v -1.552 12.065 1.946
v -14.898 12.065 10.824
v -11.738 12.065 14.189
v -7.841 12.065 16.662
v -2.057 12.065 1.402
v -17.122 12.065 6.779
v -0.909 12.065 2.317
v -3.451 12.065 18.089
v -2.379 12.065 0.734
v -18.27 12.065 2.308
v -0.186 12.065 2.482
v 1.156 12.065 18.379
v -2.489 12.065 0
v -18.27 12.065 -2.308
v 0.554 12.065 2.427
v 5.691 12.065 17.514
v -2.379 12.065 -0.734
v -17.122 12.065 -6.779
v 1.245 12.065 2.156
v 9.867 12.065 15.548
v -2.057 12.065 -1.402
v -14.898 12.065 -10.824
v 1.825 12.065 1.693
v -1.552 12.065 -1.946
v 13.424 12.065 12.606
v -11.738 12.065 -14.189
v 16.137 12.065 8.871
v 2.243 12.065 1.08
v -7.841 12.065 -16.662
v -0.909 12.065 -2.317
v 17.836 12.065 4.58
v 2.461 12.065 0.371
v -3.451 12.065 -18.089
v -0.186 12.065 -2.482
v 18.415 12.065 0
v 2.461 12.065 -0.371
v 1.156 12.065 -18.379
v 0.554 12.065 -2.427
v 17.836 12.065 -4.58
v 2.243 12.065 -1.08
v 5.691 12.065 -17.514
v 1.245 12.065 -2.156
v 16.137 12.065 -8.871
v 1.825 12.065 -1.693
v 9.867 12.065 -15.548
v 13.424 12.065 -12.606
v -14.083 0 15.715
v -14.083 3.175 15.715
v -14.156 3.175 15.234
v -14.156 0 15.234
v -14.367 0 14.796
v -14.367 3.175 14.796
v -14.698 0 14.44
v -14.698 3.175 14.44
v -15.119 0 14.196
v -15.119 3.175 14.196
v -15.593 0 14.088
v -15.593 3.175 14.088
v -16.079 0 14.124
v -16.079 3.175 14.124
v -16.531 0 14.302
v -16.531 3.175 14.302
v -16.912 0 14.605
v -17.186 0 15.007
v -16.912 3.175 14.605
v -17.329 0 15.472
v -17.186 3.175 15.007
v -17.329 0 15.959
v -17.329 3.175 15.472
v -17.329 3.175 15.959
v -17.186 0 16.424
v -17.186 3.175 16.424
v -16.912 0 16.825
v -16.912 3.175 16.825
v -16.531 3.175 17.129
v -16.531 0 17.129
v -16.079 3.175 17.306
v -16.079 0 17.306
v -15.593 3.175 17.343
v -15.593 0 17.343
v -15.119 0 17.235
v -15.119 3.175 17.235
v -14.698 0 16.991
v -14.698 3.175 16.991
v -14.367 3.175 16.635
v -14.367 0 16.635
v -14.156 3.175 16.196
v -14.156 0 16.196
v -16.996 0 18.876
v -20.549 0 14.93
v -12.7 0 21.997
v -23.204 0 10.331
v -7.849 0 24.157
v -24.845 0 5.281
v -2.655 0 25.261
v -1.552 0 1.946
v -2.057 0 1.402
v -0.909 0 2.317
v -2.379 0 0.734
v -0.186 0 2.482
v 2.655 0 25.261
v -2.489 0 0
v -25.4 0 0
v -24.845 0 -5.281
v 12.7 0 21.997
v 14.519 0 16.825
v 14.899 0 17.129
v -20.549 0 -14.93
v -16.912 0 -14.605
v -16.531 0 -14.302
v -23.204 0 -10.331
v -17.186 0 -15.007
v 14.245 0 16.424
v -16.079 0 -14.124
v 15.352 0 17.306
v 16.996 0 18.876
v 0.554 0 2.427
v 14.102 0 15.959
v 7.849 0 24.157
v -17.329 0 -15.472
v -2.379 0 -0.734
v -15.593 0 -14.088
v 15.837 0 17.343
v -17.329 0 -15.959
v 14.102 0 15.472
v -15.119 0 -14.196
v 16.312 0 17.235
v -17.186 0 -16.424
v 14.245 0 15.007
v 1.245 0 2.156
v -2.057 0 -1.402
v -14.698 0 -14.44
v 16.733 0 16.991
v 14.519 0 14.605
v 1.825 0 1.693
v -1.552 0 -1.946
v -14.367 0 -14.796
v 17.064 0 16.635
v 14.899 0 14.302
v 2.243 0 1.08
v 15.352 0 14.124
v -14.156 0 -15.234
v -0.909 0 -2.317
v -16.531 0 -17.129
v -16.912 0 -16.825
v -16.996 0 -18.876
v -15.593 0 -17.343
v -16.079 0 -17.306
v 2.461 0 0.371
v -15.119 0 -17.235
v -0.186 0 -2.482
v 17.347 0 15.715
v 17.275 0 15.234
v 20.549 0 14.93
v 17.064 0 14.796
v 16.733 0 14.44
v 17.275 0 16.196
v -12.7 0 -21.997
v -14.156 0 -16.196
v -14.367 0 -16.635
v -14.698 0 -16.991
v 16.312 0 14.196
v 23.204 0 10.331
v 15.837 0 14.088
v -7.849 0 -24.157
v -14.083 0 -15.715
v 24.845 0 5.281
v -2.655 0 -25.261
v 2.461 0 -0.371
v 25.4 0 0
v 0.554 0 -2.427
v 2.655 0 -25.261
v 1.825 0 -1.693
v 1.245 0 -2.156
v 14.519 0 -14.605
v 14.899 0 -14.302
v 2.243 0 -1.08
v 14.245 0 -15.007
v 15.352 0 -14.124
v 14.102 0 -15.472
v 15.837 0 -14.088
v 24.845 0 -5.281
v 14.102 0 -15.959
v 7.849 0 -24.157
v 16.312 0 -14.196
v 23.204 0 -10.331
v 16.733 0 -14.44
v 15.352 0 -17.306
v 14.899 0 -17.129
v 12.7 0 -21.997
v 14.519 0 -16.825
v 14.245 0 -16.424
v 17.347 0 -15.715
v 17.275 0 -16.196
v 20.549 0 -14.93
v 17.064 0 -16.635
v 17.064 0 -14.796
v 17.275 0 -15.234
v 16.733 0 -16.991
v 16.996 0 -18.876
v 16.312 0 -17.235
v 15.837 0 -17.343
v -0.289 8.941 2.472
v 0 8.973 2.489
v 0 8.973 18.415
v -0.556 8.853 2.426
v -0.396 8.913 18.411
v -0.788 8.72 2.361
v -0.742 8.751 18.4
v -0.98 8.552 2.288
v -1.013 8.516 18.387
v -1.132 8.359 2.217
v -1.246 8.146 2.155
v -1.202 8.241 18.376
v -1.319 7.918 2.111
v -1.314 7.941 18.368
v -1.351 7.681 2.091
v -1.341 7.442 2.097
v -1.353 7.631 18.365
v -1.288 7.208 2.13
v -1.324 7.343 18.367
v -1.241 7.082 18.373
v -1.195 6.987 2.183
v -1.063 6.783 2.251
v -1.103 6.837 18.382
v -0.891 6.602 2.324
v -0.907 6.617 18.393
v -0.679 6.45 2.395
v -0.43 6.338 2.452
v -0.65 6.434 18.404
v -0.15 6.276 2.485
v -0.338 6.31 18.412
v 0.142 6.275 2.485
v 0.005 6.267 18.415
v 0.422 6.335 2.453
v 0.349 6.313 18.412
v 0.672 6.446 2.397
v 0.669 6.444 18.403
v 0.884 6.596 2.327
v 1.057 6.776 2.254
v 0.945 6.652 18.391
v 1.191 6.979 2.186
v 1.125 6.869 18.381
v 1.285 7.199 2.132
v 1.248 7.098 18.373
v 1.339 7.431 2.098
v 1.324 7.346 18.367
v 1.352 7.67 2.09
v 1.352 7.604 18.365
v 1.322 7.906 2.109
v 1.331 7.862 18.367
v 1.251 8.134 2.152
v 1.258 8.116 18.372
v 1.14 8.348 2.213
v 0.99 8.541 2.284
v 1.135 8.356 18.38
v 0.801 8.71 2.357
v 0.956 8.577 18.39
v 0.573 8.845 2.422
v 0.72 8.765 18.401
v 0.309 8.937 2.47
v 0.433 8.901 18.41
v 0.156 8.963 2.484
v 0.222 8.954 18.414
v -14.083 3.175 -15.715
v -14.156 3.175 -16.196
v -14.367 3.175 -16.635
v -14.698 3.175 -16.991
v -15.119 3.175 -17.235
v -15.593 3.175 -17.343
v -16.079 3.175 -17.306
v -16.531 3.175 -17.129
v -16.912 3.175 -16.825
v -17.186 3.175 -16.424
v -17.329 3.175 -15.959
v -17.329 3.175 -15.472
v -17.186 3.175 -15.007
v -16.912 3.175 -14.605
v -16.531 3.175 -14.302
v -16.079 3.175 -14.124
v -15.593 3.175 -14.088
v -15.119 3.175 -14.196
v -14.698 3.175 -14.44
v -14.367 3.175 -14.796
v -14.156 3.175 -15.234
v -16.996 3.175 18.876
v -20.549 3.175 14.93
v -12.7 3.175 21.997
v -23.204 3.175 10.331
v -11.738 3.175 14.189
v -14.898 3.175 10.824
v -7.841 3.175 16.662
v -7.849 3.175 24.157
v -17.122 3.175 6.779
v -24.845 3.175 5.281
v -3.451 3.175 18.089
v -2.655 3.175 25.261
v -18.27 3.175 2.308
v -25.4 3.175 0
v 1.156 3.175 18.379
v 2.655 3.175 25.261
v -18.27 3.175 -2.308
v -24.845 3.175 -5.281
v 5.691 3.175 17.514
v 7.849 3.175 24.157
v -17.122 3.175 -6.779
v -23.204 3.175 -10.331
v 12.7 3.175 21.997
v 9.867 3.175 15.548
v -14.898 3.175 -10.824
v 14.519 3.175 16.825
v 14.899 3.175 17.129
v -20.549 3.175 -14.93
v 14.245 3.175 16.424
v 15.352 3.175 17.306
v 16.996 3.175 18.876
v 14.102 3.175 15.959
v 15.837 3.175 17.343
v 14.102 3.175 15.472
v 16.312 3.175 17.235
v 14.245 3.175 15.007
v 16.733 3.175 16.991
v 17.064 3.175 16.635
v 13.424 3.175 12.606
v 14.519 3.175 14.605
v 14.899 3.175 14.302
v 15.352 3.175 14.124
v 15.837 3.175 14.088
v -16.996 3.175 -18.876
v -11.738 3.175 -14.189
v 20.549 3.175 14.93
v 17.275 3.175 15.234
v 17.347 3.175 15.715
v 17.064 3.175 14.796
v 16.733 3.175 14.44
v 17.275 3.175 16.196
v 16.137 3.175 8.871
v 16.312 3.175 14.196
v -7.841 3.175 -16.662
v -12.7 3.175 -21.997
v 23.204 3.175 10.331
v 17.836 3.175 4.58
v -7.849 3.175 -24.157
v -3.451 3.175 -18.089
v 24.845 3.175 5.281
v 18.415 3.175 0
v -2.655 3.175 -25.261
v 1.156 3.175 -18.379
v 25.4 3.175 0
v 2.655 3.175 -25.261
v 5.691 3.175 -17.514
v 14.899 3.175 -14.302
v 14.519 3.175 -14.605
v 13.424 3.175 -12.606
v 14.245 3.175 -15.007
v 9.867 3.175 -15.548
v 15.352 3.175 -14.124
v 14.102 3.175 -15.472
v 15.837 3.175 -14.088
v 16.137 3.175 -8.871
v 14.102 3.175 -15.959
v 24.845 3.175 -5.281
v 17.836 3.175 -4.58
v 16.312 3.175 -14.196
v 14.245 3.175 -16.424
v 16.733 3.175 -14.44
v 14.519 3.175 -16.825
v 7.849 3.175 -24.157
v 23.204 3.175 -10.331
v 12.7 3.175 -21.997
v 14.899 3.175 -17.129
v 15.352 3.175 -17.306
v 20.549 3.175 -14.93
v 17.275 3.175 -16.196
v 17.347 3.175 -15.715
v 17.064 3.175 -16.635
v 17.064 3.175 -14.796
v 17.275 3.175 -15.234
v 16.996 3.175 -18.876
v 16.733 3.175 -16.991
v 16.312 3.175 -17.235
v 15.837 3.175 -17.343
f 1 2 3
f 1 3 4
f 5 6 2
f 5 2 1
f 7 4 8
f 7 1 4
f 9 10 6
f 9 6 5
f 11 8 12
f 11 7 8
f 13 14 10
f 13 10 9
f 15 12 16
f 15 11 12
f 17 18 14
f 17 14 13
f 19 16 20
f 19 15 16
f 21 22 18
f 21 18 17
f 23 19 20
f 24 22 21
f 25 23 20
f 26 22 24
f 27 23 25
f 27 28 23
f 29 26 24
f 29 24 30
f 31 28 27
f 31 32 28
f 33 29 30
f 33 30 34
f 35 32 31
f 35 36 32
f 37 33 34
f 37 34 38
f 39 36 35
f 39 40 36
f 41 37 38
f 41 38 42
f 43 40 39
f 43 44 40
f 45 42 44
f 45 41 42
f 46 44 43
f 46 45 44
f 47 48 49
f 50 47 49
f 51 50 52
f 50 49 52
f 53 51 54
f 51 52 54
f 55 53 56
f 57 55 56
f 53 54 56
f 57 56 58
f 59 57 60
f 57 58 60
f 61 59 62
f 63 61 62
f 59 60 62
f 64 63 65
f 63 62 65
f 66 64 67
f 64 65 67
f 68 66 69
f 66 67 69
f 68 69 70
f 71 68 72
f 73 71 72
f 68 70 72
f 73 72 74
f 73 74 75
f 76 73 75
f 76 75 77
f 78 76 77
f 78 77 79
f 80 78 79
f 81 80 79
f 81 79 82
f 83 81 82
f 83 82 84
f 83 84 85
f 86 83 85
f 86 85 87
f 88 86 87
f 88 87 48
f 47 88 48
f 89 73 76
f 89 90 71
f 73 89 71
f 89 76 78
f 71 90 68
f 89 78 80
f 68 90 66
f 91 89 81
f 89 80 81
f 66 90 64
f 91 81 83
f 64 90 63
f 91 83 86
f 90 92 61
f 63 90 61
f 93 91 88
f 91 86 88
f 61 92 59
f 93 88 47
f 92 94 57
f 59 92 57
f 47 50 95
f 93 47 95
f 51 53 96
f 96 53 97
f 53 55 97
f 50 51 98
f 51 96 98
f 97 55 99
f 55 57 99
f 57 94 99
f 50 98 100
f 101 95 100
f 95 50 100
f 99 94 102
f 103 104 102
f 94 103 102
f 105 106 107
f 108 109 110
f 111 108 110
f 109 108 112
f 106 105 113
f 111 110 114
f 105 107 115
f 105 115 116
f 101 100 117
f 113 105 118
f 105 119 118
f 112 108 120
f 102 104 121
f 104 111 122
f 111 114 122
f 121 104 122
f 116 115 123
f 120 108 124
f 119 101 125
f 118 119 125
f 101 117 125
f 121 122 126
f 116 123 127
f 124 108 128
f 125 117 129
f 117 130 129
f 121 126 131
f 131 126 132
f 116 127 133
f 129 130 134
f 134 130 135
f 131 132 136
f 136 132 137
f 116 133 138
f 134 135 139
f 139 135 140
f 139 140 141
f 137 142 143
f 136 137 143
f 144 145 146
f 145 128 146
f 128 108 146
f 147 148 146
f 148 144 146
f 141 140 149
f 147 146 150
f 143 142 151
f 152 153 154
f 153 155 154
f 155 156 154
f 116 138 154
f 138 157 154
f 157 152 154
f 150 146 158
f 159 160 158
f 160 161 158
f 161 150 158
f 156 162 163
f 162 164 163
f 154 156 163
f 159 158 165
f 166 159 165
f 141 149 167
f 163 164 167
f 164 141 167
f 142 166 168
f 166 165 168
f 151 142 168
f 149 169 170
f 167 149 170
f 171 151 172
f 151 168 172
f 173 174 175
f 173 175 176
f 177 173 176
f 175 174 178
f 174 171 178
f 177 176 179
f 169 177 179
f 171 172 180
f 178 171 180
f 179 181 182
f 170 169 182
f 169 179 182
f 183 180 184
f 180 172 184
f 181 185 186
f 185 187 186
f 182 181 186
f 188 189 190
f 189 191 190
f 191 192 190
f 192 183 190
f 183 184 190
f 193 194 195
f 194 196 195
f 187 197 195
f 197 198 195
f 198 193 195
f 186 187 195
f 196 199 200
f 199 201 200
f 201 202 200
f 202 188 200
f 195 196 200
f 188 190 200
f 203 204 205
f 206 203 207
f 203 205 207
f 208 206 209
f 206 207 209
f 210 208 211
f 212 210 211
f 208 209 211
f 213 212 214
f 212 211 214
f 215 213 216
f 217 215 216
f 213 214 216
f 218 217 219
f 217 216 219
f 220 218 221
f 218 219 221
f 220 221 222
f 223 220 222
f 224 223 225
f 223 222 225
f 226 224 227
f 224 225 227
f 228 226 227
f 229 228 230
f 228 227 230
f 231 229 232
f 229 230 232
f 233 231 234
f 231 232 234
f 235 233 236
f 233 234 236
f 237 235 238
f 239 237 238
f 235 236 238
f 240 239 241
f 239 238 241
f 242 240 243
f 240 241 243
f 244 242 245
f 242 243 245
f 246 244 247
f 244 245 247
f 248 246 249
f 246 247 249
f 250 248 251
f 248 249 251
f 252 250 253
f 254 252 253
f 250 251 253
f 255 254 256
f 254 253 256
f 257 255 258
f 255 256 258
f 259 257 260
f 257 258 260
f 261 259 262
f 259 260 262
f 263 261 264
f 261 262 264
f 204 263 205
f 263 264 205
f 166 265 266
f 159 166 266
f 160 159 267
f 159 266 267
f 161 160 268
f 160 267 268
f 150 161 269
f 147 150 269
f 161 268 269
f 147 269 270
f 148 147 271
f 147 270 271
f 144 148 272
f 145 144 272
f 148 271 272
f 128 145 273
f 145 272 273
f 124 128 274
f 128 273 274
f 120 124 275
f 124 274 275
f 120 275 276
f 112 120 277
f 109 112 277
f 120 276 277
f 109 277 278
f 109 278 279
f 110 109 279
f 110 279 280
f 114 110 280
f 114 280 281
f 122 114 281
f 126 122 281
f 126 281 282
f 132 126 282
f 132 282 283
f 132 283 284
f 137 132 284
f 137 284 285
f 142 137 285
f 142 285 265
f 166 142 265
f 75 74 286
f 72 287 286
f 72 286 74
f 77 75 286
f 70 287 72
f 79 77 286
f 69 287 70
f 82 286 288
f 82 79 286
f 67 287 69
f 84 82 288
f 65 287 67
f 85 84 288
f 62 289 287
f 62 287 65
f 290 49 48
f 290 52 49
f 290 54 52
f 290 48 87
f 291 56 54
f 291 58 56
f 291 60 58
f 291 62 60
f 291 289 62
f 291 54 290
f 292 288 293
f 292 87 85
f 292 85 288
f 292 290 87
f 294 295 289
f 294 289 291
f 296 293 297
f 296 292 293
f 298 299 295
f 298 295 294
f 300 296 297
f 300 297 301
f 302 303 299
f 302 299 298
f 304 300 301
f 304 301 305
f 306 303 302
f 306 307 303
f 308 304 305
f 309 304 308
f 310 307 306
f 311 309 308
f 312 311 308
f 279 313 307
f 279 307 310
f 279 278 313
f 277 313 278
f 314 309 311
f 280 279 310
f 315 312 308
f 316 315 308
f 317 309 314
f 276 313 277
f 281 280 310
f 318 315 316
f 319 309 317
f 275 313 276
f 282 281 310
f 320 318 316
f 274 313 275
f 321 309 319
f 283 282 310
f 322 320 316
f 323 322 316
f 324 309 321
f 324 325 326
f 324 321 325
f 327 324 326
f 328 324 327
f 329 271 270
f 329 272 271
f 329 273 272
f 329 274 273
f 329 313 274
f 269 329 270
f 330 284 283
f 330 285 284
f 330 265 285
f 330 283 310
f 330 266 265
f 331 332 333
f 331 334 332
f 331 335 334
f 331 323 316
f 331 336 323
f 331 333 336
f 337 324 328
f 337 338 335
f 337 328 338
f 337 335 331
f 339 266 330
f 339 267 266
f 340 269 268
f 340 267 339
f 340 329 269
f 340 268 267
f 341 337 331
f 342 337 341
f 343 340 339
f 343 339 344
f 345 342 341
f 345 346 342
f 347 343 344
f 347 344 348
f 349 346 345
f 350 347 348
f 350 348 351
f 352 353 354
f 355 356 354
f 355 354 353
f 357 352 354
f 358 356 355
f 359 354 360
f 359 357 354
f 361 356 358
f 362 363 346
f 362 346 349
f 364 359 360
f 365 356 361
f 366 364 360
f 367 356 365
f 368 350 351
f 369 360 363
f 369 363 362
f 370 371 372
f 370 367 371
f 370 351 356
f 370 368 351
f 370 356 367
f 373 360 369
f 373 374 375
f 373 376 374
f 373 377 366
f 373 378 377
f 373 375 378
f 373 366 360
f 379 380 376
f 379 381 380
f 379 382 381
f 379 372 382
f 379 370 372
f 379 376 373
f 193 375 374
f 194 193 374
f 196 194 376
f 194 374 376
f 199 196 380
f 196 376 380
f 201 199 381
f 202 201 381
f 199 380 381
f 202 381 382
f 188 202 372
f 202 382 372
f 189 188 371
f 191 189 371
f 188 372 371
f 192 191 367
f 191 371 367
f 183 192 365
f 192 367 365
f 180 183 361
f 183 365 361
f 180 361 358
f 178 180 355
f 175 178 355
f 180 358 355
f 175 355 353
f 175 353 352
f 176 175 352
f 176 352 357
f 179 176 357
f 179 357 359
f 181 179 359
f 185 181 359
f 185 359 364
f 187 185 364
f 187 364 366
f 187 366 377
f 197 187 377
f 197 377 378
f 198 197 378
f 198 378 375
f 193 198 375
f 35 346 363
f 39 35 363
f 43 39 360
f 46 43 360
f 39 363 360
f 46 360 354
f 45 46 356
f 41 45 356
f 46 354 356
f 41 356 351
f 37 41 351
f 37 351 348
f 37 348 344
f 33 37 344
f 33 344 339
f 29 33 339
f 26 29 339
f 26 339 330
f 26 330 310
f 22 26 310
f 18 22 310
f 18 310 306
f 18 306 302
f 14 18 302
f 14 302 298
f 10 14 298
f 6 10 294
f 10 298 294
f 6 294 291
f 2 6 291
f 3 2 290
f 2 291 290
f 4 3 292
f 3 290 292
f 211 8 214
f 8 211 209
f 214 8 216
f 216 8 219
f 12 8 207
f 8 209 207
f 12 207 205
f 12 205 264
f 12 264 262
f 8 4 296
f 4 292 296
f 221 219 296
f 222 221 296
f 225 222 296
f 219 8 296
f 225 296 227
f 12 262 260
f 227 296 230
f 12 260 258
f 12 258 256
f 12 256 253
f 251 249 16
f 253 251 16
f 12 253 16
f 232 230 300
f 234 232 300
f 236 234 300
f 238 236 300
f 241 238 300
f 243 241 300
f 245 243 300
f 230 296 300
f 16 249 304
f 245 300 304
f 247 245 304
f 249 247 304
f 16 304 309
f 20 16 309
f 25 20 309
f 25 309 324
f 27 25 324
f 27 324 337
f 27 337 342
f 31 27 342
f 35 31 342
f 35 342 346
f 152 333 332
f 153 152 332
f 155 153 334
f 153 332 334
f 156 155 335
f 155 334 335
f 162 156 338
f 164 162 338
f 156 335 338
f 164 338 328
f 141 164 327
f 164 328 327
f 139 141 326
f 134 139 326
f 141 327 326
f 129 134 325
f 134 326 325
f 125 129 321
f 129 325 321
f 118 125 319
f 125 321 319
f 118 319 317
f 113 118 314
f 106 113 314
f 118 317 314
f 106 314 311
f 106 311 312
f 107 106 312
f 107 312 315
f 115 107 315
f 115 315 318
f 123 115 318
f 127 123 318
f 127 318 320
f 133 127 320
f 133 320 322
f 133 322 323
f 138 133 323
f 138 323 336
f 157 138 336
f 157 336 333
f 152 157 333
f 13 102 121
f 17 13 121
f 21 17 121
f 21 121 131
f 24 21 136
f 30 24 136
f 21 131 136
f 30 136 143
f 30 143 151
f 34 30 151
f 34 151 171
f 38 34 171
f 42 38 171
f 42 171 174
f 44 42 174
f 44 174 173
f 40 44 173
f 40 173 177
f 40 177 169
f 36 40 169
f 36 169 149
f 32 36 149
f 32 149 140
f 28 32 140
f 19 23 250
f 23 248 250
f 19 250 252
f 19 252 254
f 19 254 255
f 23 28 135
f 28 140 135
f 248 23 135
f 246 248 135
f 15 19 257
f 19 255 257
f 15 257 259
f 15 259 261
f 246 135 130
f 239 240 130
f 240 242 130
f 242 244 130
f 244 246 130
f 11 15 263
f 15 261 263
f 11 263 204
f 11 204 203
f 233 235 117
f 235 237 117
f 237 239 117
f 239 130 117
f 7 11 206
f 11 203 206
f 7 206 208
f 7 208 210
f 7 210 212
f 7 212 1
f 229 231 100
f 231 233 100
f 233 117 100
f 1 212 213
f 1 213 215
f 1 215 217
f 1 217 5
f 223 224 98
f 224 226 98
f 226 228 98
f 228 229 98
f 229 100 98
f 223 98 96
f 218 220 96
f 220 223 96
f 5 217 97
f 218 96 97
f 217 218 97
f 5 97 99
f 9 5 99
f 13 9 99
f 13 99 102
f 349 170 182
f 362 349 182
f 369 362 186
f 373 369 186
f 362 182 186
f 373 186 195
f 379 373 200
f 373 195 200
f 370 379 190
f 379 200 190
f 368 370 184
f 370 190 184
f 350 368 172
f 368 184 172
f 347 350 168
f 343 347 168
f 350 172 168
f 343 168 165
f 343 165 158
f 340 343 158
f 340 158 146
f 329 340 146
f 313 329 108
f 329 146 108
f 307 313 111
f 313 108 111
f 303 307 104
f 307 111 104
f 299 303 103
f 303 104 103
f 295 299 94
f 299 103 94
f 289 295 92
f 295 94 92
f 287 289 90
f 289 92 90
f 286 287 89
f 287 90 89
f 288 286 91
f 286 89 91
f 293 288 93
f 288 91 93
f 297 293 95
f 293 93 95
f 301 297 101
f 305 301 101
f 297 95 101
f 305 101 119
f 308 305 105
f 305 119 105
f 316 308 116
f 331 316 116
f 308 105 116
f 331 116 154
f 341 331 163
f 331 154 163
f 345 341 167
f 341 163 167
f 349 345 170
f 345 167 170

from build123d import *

# Parameters (mm, degrees)
SKETCH10_R                 = 25.4
BOSS_EXTRUDE1_DEPTH        = 3.175
SKETCH13_R                 = 18.415
BOSS_EXTRUDE2_DEPTH        = 8.89
F_9_0_196_DIAMETER_HOLE1_D = 4.9784
SKETCH18_W                 = 1.35255
SKETCH18_H                 = 25.4
F_4_CLEARANCE_HOLE2_D      = 3.2639
F_4_CLEARANCE_HOLE2_DEPTH  = 3.302
F_4_CLEARANCE_HOLE2_TIP    = 0.980574487


with BuildPart() as part:
    # Sketch10 → Boss-Extrude1 (new body)
    with BuildSketch(Plane(origin=(0, 0, 0), x_dir=(1, 0, 0), z_dir=(0, 1, 0))):
        Circle(SKETCH10_R)
    extrude(amount=BOSS_EXTRUDE1_DEPTH)

    # Sketch13 → Boss-Extrude2 (add)
    with BuildSketch(Plane(origin=(0, 3.175, 0), x_dir=(1, 0, 0), z_dir=(0, 1, 0))):
        Circle(SKETCH13_R)
    extrude(amount=BOSS_EXTRUDE2_DEPTH)

    # #9 (0.196) Diameter Hole1 (through all)
    with Locations(Plane(origin=(0, 12.065, 0), x_dir=(1, 0, 0), z_dir=(0, 1, 0))):
        with Locations((0, 0)):
            Hole(F_9_0_196_DIAMETER_HOLE1_D / 2)

    # Sketch18 → #6-32 Tapped Hole2 (revolve, cut)
    with BuildSketch(Plane(origin=(0, 7.62, 0), x_dir=(0, 1, 0), z_dir=(1, 0, 0))):
        with Locations((0.676275, 12.7)):
            Rectangle(SKETCH18_W, SKETCH18_H)
    revolve(axis=Axis((0, 7.62, -6.35), (0, 0, 1)), mode=Mode.SUBTRACT)

    # #4 Clearance Hole2
    with Locations(Plane(origin=(0, 0, 0), x_dir=(-1, 0, 0), z_dir=(0, -1, 0))):
        with Locations((-15.715448212, -15.715448212), (15.715448212, -15.715448212), (15.715448212, 15.715448212), (-15.715448212, 15.715448212)):
            Hole(F_4_CLEARANCE_HOLE2_D / 2, depth=F_4_CLEARANCE_HOLE2_DEPTH)
            with Locations((0, 0, -(F_4_CLEARANCE_HOLE2_DEPTH + F_4_CLEARANCE_HOLE2_TIP / 2))):  # 118° drill point
                Cone(0, F_4_CLEARANCE_HOLE2_D / 2, F_4_CLEARANCE_HOLE2_TIP, mode=Mode.SUBTRACT)


solid = part.part
